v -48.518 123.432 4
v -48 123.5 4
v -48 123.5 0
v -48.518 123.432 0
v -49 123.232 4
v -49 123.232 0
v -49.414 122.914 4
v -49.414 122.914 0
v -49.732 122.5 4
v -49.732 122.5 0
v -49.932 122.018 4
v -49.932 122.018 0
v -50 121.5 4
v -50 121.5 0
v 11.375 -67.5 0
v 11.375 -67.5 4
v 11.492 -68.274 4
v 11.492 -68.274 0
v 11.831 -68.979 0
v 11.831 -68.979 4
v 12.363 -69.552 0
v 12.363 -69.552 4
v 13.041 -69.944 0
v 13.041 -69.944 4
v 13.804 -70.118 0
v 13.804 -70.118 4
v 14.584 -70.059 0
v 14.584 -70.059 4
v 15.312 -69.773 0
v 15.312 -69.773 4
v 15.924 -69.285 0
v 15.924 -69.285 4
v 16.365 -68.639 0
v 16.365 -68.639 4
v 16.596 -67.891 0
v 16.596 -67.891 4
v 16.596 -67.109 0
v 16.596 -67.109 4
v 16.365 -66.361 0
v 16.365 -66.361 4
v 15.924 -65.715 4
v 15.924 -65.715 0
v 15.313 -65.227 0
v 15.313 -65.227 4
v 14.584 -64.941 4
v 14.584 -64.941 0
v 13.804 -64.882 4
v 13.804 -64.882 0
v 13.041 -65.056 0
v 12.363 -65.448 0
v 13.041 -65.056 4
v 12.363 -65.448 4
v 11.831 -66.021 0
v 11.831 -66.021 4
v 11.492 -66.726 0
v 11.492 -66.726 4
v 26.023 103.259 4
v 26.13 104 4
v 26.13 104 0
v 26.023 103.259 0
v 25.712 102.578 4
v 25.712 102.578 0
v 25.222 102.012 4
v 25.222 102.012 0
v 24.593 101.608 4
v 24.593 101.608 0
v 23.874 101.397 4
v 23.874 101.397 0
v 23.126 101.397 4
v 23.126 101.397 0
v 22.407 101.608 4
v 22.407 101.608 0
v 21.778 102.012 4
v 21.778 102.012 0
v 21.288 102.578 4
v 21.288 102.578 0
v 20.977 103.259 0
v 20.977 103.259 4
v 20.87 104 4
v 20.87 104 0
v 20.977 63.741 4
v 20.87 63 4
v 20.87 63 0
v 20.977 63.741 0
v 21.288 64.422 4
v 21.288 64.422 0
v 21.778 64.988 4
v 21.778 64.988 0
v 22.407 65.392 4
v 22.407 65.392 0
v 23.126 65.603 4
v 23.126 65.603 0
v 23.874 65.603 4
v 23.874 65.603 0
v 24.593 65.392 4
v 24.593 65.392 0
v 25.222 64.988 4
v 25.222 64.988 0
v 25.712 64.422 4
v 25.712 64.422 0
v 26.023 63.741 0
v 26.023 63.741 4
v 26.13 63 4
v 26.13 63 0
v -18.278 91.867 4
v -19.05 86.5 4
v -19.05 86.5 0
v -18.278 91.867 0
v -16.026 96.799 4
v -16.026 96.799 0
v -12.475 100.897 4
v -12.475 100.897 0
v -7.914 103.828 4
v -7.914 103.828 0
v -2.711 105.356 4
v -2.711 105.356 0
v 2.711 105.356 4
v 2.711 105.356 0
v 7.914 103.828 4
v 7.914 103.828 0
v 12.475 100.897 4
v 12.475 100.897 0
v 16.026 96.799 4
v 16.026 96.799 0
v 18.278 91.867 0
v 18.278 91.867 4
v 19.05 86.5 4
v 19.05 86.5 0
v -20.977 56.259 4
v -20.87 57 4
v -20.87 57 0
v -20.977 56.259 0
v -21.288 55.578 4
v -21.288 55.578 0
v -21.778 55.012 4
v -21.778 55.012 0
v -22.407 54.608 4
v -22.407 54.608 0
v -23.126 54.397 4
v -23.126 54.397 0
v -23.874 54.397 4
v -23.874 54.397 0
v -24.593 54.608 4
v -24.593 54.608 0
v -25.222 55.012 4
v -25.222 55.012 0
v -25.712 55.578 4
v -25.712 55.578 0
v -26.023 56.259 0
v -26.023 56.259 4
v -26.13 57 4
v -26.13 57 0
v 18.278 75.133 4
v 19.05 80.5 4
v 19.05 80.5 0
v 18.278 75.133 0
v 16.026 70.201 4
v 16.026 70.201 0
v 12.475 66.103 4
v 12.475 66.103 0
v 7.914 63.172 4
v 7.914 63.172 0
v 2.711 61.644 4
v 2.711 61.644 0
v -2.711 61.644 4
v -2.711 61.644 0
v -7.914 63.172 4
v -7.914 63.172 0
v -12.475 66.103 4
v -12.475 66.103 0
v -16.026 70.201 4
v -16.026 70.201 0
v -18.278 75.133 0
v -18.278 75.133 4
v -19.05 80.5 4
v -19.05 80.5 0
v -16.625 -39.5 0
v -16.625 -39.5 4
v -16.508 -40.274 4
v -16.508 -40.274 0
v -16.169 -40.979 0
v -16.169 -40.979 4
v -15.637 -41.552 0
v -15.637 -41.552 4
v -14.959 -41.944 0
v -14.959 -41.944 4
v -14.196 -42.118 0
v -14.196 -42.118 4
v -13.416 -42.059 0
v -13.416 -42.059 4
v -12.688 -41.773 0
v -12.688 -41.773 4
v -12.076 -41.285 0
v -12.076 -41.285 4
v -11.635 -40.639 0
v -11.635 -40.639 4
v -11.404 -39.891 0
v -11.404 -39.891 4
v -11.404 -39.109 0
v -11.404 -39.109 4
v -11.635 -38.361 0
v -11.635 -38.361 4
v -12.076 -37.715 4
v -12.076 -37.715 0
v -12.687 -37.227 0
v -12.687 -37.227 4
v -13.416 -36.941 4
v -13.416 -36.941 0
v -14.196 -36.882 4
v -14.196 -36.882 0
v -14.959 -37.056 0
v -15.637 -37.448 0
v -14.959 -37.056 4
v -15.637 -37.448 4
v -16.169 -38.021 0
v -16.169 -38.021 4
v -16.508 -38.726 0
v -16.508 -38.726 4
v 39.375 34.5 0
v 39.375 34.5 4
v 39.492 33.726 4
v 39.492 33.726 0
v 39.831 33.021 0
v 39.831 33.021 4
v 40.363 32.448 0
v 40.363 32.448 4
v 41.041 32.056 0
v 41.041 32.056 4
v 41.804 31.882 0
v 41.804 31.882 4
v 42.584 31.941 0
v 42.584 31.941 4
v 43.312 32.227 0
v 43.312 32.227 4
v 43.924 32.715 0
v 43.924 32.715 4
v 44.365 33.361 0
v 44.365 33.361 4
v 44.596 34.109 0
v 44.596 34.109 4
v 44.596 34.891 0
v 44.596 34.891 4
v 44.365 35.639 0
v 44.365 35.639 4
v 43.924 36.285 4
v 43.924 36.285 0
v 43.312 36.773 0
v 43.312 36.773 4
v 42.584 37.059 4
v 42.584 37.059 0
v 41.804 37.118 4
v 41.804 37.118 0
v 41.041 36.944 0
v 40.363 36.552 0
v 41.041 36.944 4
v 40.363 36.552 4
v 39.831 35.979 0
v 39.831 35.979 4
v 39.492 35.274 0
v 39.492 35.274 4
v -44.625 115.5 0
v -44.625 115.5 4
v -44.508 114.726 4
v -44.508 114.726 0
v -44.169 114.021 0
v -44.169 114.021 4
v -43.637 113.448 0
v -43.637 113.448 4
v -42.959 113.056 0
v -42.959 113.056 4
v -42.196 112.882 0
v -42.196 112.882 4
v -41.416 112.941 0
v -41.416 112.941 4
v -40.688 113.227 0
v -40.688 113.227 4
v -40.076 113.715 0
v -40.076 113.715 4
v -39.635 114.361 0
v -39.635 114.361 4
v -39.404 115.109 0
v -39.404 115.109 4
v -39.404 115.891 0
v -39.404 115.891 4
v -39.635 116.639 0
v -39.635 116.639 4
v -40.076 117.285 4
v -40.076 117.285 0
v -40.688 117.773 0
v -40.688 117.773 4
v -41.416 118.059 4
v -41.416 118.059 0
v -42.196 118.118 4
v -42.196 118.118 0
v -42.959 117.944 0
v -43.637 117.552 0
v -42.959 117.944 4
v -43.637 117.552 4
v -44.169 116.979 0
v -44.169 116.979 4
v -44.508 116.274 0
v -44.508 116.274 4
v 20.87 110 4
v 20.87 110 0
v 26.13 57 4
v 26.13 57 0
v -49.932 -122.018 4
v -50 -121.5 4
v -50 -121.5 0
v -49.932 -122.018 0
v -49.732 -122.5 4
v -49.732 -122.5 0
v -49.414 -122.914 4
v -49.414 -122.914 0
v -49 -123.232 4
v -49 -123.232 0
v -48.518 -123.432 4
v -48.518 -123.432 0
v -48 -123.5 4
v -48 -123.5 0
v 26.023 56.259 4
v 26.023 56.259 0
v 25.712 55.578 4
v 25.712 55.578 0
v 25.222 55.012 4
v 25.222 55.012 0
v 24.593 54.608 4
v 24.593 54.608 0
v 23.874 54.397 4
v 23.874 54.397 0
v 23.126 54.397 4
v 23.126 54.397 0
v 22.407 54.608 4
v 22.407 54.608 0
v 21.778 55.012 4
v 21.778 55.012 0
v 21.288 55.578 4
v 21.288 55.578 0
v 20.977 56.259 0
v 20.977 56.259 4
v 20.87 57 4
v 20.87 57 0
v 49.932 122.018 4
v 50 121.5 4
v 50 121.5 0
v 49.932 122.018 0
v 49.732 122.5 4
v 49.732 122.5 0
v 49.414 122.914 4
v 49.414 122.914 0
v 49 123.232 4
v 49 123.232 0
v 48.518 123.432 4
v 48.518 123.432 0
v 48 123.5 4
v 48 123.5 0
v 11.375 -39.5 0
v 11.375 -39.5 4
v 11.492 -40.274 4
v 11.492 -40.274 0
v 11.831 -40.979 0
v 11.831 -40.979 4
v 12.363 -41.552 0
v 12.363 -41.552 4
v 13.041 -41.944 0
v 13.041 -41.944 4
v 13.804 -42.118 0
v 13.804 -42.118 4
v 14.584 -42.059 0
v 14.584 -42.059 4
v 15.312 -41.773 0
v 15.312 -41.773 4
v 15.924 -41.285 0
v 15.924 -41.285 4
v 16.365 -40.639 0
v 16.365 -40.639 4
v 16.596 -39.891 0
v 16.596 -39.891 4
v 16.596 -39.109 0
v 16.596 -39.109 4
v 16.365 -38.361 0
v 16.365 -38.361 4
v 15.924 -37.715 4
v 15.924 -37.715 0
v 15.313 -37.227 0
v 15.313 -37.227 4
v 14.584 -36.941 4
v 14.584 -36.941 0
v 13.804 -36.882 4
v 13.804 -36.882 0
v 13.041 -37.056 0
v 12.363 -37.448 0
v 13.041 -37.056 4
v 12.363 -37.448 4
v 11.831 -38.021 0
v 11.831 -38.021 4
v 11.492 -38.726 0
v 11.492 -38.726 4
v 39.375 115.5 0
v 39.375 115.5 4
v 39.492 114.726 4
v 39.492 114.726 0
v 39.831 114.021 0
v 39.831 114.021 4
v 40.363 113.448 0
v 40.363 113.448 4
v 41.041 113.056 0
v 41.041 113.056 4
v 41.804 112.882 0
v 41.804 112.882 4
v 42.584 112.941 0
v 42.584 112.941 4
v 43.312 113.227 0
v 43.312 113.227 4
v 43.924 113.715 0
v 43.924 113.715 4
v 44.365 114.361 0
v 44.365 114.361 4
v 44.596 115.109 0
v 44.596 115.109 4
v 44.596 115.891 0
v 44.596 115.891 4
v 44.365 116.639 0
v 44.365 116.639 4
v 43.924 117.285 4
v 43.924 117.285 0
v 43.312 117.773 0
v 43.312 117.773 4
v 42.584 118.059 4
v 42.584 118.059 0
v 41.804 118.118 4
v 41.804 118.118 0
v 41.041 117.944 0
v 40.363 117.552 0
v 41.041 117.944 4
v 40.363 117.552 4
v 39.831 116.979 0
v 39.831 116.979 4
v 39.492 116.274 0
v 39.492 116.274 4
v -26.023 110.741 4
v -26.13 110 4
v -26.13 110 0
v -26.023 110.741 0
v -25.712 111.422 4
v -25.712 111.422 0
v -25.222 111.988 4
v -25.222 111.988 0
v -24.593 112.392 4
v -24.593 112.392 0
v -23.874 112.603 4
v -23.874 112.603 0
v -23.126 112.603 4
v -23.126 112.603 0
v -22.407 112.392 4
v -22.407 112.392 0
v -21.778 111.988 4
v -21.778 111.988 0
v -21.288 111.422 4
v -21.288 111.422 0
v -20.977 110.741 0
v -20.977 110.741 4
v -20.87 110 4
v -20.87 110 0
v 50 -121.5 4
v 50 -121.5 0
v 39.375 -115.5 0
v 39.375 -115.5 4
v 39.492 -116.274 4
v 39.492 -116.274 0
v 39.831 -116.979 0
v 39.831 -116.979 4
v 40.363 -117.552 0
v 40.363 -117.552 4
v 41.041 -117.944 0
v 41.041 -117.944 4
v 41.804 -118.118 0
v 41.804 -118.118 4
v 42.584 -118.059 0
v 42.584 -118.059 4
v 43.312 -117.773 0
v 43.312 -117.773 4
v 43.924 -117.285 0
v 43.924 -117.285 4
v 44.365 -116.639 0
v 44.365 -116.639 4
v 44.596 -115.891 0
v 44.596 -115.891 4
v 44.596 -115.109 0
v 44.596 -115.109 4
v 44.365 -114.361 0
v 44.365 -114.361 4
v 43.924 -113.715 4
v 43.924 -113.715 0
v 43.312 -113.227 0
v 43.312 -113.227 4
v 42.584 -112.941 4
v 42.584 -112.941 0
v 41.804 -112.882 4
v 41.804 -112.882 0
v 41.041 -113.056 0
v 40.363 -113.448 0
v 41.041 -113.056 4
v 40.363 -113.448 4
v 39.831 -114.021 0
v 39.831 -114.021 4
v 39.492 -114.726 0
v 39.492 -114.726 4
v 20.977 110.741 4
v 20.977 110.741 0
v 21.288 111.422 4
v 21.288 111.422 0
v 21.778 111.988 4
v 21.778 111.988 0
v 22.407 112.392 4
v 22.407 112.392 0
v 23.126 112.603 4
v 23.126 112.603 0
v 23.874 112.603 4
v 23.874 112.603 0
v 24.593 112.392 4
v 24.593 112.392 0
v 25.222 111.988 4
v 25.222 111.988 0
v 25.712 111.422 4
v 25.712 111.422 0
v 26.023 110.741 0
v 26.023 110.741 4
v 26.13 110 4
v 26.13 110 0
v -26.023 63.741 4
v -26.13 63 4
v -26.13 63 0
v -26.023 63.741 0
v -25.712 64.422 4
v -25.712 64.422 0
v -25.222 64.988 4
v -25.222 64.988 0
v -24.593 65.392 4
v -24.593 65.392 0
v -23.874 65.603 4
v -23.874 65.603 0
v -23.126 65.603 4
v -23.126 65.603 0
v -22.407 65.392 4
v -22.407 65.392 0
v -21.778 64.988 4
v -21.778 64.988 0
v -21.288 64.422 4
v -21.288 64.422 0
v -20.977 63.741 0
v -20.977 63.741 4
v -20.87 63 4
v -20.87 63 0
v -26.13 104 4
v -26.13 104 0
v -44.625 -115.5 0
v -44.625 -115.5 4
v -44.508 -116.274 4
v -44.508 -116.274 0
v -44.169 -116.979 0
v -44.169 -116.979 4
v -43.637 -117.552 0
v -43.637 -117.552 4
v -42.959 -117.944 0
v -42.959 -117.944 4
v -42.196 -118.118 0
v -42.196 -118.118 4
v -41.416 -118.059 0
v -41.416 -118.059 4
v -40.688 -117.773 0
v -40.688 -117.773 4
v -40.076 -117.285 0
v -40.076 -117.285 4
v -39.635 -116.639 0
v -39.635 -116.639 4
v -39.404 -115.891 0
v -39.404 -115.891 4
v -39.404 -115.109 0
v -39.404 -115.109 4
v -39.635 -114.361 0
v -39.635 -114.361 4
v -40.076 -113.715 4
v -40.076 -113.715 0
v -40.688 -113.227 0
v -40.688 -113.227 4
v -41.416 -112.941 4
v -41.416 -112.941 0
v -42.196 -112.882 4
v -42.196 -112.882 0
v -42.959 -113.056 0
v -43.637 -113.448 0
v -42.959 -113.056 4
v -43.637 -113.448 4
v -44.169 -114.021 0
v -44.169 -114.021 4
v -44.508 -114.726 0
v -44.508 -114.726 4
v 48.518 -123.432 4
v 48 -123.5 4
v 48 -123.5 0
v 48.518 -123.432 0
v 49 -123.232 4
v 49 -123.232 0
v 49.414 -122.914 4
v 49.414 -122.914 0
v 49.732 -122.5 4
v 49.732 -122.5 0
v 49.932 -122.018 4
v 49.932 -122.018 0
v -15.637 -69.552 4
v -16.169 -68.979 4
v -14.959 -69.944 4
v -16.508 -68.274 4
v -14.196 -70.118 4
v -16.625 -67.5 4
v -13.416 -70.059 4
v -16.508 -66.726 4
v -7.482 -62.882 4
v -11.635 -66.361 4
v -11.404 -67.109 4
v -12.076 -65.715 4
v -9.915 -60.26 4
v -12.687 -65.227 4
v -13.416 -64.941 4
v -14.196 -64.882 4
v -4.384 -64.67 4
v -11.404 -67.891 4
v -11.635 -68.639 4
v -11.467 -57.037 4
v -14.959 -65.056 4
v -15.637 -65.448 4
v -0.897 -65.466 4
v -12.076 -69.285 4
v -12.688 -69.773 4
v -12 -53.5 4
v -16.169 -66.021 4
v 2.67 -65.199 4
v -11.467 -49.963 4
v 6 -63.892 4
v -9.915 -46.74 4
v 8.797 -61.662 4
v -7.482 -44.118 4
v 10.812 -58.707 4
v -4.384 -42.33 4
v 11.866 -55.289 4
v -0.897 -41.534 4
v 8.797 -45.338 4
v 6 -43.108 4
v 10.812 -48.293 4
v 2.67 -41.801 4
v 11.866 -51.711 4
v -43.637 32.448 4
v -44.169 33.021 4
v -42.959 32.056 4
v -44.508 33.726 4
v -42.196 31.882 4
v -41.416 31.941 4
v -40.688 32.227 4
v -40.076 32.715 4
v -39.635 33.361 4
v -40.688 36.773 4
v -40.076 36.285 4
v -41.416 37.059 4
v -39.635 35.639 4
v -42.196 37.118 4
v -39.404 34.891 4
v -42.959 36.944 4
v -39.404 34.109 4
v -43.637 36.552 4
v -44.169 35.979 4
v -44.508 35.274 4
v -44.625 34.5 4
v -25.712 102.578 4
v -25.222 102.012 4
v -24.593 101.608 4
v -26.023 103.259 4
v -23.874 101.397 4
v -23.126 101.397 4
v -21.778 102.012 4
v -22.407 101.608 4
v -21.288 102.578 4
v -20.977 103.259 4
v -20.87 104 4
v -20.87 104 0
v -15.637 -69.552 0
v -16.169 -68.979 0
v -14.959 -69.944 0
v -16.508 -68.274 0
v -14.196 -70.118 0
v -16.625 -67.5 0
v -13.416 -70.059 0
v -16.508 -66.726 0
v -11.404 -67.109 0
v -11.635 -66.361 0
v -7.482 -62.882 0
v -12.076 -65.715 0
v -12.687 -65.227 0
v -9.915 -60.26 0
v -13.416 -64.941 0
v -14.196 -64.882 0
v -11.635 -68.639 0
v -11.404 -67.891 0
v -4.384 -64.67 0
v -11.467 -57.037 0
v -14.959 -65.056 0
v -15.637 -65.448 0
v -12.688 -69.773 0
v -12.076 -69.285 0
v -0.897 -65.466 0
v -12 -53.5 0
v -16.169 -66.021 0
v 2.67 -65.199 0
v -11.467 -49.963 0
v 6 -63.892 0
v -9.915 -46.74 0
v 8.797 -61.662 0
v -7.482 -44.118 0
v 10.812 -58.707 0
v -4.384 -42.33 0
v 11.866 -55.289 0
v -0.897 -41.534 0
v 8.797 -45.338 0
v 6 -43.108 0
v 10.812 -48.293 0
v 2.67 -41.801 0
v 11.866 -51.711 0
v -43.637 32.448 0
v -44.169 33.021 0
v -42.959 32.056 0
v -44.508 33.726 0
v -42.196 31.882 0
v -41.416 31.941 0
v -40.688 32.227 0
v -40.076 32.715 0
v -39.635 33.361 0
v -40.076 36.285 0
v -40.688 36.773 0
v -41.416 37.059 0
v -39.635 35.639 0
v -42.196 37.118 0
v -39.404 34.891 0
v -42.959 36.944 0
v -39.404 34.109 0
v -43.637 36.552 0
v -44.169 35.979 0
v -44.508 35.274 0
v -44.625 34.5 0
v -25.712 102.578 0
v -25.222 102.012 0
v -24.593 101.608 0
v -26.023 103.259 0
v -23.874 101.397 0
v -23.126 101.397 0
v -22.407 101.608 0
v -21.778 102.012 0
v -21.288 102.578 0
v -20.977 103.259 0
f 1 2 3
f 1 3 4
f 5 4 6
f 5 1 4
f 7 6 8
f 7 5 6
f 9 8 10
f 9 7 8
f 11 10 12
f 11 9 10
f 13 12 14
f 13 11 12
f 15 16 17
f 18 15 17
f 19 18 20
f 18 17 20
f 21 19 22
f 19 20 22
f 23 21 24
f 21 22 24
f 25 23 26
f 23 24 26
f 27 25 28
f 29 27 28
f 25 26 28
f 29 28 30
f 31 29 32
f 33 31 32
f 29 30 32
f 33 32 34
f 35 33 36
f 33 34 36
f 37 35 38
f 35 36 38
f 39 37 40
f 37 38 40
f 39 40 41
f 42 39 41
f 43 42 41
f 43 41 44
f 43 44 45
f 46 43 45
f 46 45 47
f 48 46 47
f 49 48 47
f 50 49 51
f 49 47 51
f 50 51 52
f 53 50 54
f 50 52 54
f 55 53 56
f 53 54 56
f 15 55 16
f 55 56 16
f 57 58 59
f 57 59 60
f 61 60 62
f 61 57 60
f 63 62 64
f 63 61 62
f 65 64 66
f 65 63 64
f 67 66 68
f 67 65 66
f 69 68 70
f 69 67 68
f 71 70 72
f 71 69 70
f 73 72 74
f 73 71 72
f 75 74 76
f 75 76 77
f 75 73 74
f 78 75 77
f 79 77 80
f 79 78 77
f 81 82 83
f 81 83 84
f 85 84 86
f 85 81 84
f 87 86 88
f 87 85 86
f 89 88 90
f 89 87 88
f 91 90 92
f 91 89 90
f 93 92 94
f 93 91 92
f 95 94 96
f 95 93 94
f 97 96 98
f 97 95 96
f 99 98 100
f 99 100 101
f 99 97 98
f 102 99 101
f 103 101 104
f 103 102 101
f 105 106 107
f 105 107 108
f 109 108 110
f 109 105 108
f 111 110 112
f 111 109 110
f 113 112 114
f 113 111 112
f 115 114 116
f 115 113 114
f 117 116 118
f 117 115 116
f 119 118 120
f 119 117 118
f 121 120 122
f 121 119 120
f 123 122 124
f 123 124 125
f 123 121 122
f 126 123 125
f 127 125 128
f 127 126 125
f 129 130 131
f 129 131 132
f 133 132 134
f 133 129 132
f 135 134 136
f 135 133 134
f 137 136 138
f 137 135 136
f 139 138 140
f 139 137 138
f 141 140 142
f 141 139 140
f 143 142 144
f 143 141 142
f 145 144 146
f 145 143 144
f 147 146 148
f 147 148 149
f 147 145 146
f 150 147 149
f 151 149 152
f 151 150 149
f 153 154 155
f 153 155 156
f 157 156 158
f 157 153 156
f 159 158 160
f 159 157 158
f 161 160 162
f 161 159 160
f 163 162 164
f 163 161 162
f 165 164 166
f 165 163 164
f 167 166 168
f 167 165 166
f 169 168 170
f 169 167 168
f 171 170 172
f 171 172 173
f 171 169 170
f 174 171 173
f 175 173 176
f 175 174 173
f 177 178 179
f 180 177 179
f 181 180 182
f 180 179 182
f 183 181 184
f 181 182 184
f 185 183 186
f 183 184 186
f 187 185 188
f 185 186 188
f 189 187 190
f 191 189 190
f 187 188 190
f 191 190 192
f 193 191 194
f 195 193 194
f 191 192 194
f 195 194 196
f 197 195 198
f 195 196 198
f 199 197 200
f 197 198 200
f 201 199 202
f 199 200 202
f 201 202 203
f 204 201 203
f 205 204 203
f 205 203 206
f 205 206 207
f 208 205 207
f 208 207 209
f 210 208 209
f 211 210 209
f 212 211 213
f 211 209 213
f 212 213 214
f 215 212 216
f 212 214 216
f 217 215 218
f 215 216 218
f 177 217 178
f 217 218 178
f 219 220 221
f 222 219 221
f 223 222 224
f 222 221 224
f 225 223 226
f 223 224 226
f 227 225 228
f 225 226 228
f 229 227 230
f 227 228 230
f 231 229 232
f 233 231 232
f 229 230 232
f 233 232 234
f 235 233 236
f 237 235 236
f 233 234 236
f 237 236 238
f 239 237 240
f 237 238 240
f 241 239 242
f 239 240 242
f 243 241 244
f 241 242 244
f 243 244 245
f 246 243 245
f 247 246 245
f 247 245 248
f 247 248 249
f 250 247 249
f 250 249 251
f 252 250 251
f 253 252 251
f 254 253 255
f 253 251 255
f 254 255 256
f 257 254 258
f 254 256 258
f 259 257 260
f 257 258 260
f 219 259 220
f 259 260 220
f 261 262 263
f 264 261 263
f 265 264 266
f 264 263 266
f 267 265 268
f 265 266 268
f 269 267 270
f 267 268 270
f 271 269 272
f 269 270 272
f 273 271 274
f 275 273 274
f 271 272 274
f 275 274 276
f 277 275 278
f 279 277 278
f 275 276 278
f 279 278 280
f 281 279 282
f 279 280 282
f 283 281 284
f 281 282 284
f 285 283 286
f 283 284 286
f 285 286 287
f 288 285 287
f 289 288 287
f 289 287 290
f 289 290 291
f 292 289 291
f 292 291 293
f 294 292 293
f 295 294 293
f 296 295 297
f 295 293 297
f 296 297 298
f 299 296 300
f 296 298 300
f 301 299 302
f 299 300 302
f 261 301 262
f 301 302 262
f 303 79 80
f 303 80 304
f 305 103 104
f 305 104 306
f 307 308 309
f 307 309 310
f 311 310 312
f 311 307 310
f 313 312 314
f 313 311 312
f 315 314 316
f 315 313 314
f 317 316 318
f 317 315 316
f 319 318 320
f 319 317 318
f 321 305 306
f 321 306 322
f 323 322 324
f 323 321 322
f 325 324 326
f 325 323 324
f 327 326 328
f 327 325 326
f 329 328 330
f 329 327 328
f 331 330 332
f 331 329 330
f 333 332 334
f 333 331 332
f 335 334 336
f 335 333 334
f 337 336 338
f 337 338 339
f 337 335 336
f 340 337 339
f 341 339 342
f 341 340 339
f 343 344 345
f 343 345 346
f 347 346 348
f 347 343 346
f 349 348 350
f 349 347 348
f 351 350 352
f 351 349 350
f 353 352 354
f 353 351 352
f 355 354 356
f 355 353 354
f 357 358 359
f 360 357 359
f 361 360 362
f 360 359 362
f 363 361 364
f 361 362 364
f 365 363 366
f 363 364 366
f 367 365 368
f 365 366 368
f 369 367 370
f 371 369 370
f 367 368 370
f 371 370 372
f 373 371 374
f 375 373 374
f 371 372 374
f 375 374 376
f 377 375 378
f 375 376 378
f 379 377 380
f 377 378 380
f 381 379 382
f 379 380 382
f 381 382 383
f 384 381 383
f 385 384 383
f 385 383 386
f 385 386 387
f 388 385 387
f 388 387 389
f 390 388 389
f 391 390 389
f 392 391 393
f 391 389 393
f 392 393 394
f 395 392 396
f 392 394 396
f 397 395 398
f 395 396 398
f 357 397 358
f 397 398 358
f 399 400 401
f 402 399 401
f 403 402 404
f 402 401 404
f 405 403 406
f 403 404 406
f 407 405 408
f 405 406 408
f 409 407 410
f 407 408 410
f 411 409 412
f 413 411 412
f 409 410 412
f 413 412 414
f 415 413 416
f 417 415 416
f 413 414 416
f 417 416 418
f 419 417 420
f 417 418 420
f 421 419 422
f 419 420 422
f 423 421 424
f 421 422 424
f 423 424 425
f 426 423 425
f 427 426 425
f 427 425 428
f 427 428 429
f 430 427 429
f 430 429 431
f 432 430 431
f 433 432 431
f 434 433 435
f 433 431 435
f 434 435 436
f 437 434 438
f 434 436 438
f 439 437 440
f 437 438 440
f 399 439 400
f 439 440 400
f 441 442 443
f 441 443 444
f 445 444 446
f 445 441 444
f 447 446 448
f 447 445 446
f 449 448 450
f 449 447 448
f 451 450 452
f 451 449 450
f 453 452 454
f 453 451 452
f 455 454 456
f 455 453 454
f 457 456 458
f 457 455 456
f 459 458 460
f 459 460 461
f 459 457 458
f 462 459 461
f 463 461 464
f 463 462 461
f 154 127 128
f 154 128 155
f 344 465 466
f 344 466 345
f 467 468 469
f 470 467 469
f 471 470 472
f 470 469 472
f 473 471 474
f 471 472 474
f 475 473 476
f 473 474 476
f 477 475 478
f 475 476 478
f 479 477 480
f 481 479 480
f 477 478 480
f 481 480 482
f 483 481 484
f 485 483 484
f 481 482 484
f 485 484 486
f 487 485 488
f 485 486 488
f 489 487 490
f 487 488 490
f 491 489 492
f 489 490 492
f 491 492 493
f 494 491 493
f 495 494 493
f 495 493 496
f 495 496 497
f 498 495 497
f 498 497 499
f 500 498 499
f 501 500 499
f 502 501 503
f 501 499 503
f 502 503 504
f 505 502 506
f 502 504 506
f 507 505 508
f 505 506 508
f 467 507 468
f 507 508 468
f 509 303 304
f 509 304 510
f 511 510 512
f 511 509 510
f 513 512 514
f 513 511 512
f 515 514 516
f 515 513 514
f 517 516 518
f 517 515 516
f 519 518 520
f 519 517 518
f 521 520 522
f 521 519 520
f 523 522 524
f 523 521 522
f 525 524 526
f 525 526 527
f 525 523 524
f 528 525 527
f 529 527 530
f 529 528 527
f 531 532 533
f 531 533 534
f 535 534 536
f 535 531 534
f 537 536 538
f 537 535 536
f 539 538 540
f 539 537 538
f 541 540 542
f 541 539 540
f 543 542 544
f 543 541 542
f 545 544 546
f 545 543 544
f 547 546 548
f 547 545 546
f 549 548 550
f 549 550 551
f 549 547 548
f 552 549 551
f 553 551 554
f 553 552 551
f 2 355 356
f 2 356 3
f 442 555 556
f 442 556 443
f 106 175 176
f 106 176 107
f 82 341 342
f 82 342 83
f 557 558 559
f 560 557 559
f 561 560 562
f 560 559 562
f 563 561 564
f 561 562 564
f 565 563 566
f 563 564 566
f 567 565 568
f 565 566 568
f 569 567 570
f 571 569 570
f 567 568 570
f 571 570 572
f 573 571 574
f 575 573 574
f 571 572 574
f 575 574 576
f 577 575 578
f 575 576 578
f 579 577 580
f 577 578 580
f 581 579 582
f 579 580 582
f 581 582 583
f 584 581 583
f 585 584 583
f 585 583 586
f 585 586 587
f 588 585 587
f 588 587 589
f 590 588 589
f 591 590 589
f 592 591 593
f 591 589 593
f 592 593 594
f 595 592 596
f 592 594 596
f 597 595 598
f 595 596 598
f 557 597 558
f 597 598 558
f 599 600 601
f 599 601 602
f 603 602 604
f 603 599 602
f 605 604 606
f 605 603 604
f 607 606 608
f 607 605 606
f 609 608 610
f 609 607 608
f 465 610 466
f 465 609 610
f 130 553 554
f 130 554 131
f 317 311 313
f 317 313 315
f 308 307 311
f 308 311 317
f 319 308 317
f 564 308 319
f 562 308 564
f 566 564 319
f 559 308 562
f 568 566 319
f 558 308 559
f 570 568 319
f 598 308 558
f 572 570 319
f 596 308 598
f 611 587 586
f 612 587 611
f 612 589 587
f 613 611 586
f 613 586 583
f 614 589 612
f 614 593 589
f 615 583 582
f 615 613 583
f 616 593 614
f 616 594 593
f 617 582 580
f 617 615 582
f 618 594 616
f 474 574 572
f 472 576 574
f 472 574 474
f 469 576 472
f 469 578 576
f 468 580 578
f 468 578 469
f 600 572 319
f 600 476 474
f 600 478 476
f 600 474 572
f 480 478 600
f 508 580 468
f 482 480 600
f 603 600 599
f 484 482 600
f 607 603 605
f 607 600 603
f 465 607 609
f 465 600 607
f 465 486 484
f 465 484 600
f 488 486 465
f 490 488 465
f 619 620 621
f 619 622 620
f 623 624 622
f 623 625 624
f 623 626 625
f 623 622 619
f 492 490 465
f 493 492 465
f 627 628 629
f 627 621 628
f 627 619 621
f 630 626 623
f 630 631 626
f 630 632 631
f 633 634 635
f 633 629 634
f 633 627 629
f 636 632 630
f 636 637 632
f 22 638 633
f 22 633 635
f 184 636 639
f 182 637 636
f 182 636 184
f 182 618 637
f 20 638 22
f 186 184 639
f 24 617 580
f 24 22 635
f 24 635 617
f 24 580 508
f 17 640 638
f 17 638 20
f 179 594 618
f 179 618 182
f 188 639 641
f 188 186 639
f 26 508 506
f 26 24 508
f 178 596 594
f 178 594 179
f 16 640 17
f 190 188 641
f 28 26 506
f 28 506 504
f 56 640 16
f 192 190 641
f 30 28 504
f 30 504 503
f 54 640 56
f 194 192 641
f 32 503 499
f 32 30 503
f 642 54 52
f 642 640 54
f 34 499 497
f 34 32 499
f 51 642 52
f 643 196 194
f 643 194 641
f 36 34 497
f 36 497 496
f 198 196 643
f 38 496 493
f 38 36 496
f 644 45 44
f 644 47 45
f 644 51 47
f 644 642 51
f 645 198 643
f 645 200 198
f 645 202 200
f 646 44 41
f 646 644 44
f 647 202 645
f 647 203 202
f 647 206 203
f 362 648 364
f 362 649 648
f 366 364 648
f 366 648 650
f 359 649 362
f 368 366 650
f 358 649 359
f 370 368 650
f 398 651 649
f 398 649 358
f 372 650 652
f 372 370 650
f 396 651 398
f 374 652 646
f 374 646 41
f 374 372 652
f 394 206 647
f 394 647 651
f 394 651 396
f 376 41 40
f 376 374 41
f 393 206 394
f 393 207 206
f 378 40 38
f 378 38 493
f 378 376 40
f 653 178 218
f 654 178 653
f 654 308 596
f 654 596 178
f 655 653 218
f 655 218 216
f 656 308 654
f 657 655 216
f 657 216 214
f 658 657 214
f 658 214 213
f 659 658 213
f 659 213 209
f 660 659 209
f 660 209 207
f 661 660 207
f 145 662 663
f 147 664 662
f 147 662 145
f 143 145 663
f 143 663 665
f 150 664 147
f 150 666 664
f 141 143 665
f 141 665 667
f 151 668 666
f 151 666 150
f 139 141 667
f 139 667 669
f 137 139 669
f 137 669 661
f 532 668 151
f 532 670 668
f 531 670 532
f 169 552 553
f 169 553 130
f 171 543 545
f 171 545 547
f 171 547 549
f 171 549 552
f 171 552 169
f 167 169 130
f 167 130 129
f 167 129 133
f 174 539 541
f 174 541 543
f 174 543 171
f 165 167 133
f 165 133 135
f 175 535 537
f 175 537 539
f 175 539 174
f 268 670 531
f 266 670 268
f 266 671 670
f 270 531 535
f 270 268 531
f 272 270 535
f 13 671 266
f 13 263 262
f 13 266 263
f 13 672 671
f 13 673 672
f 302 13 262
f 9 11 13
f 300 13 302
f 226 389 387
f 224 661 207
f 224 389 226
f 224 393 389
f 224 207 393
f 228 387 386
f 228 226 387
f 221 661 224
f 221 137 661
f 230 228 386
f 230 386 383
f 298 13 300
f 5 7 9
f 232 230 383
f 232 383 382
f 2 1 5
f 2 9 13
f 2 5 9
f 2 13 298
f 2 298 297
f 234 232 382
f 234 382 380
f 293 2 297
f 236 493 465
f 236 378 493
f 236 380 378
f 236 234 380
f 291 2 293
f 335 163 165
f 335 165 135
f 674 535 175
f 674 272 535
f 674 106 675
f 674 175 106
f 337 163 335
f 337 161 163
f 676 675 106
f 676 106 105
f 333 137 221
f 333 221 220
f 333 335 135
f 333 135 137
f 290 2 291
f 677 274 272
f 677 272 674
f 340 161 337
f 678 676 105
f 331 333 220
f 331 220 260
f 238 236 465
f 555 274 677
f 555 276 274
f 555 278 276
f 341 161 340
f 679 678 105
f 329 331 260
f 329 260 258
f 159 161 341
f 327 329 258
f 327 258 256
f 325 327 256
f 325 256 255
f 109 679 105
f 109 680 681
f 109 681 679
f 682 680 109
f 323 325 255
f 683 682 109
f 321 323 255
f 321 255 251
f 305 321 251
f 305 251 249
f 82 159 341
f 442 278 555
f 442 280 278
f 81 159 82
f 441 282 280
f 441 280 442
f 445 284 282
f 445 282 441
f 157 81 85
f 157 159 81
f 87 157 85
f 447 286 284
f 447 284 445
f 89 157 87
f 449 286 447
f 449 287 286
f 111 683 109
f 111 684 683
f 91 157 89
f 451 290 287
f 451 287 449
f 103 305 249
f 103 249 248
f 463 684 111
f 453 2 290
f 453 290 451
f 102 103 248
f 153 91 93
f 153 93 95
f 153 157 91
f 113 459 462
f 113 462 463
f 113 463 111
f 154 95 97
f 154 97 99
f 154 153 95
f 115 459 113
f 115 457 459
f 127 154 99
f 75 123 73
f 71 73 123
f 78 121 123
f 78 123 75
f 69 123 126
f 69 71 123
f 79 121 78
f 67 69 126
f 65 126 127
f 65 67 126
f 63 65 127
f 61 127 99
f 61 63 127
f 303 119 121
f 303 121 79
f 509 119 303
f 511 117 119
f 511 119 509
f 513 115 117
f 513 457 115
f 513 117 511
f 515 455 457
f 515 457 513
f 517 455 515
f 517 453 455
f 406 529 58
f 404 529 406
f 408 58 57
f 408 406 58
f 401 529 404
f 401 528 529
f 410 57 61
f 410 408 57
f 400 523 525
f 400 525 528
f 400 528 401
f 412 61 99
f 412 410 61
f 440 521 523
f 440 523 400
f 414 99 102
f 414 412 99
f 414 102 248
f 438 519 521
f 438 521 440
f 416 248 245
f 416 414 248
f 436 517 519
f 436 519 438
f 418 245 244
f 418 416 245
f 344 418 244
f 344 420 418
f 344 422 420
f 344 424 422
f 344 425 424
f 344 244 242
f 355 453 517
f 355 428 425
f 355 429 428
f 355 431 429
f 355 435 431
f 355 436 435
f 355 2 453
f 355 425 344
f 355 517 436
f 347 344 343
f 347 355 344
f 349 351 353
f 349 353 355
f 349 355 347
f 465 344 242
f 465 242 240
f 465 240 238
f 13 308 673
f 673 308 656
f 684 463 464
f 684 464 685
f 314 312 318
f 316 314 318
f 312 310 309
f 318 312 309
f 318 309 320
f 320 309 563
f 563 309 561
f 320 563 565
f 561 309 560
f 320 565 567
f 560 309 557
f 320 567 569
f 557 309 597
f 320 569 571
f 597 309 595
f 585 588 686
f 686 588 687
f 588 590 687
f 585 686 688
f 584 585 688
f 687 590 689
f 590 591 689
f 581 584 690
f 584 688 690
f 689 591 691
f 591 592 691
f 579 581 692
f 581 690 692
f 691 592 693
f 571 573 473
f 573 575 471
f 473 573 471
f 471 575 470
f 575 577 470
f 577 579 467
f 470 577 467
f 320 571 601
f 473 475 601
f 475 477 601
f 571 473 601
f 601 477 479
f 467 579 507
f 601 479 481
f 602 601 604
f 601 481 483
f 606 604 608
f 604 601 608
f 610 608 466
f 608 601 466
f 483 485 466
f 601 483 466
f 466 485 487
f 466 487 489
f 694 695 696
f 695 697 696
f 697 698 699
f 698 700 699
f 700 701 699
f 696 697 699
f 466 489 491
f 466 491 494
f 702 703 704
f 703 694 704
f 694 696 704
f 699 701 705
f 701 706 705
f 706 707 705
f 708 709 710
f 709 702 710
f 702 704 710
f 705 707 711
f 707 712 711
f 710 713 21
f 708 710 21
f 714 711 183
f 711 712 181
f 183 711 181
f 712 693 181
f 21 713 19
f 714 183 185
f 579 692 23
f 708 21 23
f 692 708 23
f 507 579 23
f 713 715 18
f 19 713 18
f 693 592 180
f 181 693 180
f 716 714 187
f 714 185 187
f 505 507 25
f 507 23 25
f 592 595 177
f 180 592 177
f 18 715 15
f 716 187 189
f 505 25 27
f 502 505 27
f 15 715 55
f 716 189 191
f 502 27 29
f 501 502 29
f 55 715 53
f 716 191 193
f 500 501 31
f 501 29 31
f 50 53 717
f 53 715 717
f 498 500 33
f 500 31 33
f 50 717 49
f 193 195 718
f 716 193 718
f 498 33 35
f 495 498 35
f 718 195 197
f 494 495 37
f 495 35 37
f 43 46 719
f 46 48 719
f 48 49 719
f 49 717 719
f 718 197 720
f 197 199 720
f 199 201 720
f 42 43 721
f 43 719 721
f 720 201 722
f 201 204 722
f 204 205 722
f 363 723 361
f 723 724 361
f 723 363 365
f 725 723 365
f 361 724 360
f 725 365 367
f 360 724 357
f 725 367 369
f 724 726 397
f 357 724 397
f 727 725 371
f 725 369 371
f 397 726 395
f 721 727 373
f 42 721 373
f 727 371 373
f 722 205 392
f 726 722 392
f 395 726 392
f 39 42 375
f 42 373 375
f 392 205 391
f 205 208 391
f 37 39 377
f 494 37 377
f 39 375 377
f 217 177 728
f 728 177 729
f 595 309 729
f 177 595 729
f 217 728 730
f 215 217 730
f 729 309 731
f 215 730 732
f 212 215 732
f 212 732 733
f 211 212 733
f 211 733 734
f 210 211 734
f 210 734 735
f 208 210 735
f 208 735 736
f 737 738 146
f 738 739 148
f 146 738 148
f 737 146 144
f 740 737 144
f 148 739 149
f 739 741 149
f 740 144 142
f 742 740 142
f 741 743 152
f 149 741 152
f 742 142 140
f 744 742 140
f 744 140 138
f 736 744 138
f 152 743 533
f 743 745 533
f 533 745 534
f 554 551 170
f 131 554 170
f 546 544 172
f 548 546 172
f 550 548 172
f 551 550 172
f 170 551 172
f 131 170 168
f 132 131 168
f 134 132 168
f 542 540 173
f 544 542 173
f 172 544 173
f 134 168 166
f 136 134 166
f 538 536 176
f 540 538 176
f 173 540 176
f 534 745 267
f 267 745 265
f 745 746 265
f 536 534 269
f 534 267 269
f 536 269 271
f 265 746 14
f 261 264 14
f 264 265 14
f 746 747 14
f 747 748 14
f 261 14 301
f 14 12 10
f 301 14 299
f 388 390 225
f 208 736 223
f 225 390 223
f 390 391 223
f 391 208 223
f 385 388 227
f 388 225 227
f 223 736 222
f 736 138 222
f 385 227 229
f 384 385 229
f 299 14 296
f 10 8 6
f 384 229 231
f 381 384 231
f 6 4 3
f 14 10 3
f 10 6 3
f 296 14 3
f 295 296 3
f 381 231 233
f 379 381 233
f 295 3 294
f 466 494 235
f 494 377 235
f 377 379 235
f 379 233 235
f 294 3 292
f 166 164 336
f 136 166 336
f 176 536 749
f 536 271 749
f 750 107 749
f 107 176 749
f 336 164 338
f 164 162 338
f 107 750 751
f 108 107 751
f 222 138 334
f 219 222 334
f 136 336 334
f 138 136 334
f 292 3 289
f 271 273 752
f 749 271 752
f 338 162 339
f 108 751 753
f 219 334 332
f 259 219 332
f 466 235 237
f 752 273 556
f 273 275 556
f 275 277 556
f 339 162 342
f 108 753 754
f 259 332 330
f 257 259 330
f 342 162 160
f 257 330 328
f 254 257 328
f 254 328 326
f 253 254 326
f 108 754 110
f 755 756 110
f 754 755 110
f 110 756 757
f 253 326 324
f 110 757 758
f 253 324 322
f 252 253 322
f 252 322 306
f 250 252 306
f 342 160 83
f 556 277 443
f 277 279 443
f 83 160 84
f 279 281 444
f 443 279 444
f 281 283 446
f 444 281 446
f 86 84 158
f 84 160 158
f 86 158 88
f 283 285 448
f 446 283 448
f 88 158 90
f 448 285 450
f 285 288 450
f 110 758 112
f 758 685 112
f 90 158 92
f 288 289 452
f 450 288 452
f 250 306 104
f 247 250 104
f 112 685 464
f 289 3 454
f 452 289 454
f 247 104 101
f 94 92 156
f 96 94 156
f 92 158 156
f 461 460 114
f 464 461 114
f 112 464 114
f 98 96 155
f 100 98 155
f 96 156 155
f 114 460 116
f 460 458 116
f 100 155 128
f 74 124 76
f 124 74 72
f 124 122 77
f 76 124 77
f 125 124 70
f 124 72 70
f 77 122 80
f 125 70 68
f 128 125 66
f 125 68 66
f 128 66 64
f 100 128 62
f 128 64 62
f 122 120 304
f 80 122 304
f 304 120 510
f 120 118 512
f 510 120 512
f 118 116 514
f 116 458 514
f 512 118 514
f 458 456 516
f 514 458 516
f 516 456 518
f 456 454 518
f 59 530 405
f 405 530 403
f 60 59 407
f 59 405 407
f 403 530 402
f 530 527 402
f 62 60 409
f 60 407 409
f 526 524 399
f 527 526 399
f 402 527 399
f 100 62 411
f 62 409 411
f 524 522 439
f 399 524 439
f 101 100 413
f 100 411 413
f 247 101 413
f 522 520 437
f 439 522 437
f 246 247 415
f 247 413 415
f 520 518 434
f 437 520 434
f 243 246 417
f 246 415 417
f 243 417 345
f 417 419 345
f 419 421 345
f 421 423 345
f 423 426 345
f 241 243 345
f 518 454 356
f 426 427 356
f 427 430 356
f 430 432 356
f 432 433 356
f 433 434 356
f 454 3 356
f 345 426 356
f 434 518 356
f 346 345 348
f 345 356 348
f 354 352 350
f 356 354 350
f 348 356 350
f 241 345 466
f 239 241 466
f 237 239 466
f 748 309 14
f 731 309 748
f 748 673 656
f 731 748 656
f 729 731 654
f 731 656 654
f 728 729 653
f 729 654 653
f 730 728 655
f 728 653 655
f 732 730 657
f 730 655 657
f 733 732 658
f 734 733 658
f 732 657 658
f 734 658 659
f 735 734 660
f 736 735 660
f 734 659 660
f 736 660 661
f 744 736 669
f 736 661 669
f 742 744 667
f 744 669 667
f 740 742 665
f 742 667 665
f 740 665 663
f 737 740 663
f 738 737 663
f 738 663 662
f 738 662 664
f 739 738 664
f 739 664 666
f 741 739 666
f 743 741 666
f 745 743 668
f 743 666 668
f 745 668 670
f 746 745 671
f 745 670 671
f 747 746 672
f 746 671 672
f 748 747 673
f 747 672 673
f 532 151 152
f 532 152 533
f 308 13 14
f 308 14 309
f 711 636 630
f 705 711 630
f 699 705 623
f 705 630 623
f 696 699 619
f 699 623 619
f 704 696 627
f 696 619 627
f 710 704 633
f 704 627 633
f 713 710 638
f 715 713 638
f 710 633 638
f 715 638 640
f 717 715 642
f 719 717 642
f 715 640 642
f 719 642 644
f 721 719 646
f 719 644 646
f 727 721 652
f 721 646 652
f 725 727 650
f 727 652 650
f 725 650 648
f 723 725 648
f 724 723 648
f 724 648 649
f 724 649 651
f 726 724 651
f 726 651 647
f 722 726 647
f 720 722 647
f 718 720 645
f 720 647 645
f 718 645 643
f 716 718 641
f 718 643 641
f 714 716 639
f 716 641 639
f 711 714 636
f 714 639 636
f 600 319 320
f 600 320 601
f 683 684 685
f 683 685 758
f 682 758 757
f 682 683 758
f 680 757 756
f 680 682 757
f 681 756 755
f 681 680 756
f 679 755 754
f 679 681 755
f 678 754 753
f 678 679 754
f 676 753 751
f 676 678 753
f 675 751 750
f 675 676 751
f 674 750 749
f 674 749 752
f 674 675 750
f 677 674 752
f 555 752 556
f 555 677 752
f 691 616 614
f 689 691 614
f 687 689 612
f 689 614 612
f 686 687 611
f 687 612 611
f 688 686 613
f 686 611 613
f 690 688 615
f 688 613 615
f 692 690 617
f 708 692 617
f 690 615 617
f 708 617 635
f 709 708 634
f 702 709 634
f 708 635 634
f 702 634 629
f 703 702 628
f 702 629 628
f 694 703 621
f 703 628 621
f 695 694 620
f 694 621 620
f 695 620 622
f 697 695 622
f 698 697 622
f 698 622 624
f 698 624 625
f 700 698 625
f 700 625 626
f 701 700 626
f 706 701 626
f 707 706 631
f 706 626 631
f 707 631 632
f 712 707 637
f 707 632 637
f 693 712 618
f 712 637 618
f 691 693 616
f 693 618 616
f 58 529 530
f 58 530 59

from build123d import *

# Parameters (mm, degrees)
SKETCH1_R           = 2.625
SKETCH1_R_2         = 12
BOSS_EXTRUDE1_DEPTH = 4


with BuildPart() as part:
    # Sketch1 → Boss-Extrude1 (new body)
    with BuildSketch(Plane.XY.offset(4)):
        with BuildLine():
            Line((-48, -123.5), (48, -123.5))
            ThreePointArc((48, -123.5), (49.414213562, -122.914213562), (50, -121.5))
            Line((50, -121.5), (50, 121.5))
            ThreePointArc((50, 121.5), (49.414213562, 122.914213562), (48, 123.5))
            Line((48, 123.5), (-48, 123.5))
            ThreePointArc((-48, 123.5), (-49.414213562, 122.914213562), (-50, 121.5))
            Line((-50, 121.5), (-50, -121.5))
            ThreePointArc((-50, -121.5), (-49.414213562, -122.914213562), (-48, -123.5))
        make_face()
        with Locations(Location((14, -67.5, 0), (0, 0, 180))):
            Circle(SKETCH1_R, mode=Mode.SUBTRACT)
        with Locations(Location((-14, -67.5, 0), (0, 0, 180))):
            Circle(SKETCH1_R, mode=Mode.SUBTRACT)
        with Locations(Location((14, -39.5, 0), (0, 0, 180))):
            Circle(SKETCH1_R, mode=Mode.SUBTRACT)
        with Locations(Location((42, 115.5, 0), (0, 0, 180))):
            Circle(SKETCH1_R, mode=Mode.SUBTRACT)
        with Locations(Location((0, -53.5, 0), (0, 0, 180))):
            Circle(SKETCH1_R_2, mode=Mode.SUBTRACT)
        with Locations(Location((-42, 34.5, 0), (0, 0, 180))):
            Circle(SKETCH1_R, mode=Mode.SUBTRACT)
        with Locations(Location((-42, -115.5, 0), (0, 0, 180))):
            Circle(SKETCH1_R, mode=Mode.SUBTRACT)
        with Locations(Location((-14, -39.5, 0), (0, 0, 180))):
            Circle(SKETCH1_R, mode=Mode.SUBTRACT)
        with Locations(Location((42, 34.5, 0), (0, 0, 180))):
            Circle(SKETCH1_R, mode=Mode.SUBTRACT)
        with Locations(Location((42, -115.5, 0), (0, 0, 180))):
            Circle(SKETCH1_R, mode=Mode.SUBTRACT)
        with Locations(Location((-42, 115.5, 0), (0, 0, 180))):
            Circle(SKETCH1_R, mode=Mode.SUBTRACT)
        with BuildLine():
            Line((-26.13, 57), (-26.13, 63))
            ThreePointArc((-26.13, 63), (-23.5, 65.63), (-20.87, 63))
            Line((-20.87, 63), (-20.87, 57))
            ThreePointArc((-20.87, 57), (-23.5, 54.37), (-26.13, 57))
        make_face(mode=Mode.SUBTRACT)
        with BuildLine():
            Line((20.87, 104), (20.87, 110))
            ThreePointArc((20.87, 110), (23.5, 112.63), (26.13, 110))
            Line((26.13, 110), (26.13, 104))
            ThreePointArc((26.13, 104), (23.5, 101.37), (20.87, 104))
        make_face(mode=Mode.SUBTRACT)
        with BuildLine():
            Line((-19.05, 80.5), (-19.05, 86.5))
            ThreePointArc((-19.05, 86.5), (0, 105.55), (19.05, 86.5))
            Line((19.05, 86.5), (19.05, 80.5))
            ThreePointArc((19.05, 80.5), (0, 61.45), (-19.05, 80.5))
        make_face(mode=Mode.SUBTRACT)
        with BuildLine():
            Line((26.13, 63), (26.13, 57))
            ThreePointArc((26.13, 57), (23.5, 54.37), (20.87, 57))
            Line((20.87, 57), (20.87, 63))
            ThreePointArc((20.87, 63), (23.5, 65.63), (26.13, 63))
        make_face(mode=Mode.SUBTRACT)
        with BuildLine():
            Line((-20.87, 110), (-20.87, 104))
            ThreePointArc((-20.87, 104), (-23.5, 101.37), (-26.13, 104))
            Line((-26.13, 104), (-26.13, 110))
            ThreePointArc((-26.13, 110), (-23.5, 112.63), (-20.87, 110))
        make_face(mode=Mode.SUBTRACT)
    extrude(amount=-BOSS_EXTRUDE1_DEPTH)


solid = part.part
